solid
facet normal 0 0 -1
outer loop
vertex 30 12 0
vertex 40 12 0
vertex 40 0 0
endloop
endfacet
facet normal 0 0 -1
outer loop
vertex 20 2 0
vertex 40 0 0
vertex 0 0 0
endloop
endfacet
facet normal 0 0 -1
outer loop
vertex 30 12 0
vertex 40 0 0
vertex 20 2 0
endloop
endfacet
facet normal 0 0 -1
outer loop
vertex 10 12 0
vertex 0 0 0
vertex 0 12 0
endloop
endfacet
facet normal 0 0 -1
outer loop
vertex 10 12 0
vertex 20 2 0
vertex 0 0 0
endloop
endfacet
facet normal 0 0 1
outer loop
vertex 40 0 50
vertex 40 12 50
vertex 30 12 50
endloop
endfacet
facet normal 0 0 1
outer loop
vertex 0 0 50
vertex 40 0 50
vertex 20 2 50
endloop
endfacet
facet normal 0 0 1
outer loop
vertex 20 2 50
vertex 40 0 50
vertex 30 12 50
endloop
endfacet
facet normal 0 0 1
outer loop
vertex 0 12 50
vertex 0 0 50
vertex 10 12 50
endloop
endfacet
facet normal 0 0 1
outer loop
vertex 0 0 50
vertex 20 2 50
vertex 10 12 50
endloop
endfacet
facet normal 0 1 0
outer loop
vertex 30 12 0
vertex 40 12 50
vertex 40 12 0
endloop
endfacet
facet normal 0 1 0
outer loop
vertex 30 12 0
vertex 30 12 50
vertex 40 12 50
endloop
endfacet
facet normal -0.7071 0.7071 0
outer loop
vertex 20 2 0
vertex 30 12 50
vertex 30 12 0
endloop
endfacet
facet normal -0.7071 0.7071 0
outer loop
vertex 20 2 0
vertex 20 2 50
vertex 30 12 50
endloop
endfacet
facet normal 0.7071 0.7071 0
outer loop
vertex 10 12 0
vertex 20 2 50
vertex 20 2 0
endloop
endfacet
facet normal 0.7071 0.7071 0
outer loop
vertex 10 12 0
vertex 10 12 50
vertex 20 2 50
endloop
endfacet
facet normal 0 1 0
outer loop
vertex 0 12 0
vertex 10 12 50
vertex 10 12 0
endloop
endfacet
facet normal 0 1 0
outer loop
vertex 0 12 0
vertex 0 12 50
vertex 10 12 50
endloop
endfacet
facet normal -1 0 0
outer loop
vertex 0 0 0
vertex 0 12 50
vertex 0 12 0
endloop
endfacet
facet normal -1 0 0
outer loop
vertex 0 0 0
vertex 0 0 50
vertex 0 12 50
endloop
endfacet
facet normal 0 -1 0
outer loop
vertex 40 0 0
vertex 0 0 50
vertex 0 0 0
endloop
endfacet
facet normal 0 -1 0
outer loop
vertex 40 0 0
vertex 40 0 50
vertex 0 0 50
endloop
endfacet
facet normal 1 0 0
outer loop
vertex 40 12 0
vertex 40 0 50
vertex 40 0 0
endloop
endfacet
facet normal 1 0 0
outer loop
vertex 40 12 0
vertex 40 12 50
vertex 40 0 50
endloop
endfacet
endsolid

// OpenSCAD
$fn = 32;

// ----------------------------------------------------------------------
// V guide rail: vway, 40 mm wide
// ----------------------------------------------------------------------

// --- parameters (mm) ---
rail_w = 40;              // rail width, X
base_t = 12;              // base plate thickness
v_depth = 10;             // V feature depth / height
v_half_w = 10;            // half width of the V at the base face
plate_t = 50;             // rail length, Z (the extrusion height)
fit_tol = 0.02;           // declared fit tolerance (prompt contract)
free_tol = 0.2;           // declared free tolerance (prompt contract)

profile = [[0, 0], [40, 0], [40, 12], [30, 12], [20, 2], [10, 12], [0, 12]];  // primary outline, 7 points, counter clockwise

// --- the one profile operation ---
linear_extrude(height = plate_t) polygon(points = profile);
